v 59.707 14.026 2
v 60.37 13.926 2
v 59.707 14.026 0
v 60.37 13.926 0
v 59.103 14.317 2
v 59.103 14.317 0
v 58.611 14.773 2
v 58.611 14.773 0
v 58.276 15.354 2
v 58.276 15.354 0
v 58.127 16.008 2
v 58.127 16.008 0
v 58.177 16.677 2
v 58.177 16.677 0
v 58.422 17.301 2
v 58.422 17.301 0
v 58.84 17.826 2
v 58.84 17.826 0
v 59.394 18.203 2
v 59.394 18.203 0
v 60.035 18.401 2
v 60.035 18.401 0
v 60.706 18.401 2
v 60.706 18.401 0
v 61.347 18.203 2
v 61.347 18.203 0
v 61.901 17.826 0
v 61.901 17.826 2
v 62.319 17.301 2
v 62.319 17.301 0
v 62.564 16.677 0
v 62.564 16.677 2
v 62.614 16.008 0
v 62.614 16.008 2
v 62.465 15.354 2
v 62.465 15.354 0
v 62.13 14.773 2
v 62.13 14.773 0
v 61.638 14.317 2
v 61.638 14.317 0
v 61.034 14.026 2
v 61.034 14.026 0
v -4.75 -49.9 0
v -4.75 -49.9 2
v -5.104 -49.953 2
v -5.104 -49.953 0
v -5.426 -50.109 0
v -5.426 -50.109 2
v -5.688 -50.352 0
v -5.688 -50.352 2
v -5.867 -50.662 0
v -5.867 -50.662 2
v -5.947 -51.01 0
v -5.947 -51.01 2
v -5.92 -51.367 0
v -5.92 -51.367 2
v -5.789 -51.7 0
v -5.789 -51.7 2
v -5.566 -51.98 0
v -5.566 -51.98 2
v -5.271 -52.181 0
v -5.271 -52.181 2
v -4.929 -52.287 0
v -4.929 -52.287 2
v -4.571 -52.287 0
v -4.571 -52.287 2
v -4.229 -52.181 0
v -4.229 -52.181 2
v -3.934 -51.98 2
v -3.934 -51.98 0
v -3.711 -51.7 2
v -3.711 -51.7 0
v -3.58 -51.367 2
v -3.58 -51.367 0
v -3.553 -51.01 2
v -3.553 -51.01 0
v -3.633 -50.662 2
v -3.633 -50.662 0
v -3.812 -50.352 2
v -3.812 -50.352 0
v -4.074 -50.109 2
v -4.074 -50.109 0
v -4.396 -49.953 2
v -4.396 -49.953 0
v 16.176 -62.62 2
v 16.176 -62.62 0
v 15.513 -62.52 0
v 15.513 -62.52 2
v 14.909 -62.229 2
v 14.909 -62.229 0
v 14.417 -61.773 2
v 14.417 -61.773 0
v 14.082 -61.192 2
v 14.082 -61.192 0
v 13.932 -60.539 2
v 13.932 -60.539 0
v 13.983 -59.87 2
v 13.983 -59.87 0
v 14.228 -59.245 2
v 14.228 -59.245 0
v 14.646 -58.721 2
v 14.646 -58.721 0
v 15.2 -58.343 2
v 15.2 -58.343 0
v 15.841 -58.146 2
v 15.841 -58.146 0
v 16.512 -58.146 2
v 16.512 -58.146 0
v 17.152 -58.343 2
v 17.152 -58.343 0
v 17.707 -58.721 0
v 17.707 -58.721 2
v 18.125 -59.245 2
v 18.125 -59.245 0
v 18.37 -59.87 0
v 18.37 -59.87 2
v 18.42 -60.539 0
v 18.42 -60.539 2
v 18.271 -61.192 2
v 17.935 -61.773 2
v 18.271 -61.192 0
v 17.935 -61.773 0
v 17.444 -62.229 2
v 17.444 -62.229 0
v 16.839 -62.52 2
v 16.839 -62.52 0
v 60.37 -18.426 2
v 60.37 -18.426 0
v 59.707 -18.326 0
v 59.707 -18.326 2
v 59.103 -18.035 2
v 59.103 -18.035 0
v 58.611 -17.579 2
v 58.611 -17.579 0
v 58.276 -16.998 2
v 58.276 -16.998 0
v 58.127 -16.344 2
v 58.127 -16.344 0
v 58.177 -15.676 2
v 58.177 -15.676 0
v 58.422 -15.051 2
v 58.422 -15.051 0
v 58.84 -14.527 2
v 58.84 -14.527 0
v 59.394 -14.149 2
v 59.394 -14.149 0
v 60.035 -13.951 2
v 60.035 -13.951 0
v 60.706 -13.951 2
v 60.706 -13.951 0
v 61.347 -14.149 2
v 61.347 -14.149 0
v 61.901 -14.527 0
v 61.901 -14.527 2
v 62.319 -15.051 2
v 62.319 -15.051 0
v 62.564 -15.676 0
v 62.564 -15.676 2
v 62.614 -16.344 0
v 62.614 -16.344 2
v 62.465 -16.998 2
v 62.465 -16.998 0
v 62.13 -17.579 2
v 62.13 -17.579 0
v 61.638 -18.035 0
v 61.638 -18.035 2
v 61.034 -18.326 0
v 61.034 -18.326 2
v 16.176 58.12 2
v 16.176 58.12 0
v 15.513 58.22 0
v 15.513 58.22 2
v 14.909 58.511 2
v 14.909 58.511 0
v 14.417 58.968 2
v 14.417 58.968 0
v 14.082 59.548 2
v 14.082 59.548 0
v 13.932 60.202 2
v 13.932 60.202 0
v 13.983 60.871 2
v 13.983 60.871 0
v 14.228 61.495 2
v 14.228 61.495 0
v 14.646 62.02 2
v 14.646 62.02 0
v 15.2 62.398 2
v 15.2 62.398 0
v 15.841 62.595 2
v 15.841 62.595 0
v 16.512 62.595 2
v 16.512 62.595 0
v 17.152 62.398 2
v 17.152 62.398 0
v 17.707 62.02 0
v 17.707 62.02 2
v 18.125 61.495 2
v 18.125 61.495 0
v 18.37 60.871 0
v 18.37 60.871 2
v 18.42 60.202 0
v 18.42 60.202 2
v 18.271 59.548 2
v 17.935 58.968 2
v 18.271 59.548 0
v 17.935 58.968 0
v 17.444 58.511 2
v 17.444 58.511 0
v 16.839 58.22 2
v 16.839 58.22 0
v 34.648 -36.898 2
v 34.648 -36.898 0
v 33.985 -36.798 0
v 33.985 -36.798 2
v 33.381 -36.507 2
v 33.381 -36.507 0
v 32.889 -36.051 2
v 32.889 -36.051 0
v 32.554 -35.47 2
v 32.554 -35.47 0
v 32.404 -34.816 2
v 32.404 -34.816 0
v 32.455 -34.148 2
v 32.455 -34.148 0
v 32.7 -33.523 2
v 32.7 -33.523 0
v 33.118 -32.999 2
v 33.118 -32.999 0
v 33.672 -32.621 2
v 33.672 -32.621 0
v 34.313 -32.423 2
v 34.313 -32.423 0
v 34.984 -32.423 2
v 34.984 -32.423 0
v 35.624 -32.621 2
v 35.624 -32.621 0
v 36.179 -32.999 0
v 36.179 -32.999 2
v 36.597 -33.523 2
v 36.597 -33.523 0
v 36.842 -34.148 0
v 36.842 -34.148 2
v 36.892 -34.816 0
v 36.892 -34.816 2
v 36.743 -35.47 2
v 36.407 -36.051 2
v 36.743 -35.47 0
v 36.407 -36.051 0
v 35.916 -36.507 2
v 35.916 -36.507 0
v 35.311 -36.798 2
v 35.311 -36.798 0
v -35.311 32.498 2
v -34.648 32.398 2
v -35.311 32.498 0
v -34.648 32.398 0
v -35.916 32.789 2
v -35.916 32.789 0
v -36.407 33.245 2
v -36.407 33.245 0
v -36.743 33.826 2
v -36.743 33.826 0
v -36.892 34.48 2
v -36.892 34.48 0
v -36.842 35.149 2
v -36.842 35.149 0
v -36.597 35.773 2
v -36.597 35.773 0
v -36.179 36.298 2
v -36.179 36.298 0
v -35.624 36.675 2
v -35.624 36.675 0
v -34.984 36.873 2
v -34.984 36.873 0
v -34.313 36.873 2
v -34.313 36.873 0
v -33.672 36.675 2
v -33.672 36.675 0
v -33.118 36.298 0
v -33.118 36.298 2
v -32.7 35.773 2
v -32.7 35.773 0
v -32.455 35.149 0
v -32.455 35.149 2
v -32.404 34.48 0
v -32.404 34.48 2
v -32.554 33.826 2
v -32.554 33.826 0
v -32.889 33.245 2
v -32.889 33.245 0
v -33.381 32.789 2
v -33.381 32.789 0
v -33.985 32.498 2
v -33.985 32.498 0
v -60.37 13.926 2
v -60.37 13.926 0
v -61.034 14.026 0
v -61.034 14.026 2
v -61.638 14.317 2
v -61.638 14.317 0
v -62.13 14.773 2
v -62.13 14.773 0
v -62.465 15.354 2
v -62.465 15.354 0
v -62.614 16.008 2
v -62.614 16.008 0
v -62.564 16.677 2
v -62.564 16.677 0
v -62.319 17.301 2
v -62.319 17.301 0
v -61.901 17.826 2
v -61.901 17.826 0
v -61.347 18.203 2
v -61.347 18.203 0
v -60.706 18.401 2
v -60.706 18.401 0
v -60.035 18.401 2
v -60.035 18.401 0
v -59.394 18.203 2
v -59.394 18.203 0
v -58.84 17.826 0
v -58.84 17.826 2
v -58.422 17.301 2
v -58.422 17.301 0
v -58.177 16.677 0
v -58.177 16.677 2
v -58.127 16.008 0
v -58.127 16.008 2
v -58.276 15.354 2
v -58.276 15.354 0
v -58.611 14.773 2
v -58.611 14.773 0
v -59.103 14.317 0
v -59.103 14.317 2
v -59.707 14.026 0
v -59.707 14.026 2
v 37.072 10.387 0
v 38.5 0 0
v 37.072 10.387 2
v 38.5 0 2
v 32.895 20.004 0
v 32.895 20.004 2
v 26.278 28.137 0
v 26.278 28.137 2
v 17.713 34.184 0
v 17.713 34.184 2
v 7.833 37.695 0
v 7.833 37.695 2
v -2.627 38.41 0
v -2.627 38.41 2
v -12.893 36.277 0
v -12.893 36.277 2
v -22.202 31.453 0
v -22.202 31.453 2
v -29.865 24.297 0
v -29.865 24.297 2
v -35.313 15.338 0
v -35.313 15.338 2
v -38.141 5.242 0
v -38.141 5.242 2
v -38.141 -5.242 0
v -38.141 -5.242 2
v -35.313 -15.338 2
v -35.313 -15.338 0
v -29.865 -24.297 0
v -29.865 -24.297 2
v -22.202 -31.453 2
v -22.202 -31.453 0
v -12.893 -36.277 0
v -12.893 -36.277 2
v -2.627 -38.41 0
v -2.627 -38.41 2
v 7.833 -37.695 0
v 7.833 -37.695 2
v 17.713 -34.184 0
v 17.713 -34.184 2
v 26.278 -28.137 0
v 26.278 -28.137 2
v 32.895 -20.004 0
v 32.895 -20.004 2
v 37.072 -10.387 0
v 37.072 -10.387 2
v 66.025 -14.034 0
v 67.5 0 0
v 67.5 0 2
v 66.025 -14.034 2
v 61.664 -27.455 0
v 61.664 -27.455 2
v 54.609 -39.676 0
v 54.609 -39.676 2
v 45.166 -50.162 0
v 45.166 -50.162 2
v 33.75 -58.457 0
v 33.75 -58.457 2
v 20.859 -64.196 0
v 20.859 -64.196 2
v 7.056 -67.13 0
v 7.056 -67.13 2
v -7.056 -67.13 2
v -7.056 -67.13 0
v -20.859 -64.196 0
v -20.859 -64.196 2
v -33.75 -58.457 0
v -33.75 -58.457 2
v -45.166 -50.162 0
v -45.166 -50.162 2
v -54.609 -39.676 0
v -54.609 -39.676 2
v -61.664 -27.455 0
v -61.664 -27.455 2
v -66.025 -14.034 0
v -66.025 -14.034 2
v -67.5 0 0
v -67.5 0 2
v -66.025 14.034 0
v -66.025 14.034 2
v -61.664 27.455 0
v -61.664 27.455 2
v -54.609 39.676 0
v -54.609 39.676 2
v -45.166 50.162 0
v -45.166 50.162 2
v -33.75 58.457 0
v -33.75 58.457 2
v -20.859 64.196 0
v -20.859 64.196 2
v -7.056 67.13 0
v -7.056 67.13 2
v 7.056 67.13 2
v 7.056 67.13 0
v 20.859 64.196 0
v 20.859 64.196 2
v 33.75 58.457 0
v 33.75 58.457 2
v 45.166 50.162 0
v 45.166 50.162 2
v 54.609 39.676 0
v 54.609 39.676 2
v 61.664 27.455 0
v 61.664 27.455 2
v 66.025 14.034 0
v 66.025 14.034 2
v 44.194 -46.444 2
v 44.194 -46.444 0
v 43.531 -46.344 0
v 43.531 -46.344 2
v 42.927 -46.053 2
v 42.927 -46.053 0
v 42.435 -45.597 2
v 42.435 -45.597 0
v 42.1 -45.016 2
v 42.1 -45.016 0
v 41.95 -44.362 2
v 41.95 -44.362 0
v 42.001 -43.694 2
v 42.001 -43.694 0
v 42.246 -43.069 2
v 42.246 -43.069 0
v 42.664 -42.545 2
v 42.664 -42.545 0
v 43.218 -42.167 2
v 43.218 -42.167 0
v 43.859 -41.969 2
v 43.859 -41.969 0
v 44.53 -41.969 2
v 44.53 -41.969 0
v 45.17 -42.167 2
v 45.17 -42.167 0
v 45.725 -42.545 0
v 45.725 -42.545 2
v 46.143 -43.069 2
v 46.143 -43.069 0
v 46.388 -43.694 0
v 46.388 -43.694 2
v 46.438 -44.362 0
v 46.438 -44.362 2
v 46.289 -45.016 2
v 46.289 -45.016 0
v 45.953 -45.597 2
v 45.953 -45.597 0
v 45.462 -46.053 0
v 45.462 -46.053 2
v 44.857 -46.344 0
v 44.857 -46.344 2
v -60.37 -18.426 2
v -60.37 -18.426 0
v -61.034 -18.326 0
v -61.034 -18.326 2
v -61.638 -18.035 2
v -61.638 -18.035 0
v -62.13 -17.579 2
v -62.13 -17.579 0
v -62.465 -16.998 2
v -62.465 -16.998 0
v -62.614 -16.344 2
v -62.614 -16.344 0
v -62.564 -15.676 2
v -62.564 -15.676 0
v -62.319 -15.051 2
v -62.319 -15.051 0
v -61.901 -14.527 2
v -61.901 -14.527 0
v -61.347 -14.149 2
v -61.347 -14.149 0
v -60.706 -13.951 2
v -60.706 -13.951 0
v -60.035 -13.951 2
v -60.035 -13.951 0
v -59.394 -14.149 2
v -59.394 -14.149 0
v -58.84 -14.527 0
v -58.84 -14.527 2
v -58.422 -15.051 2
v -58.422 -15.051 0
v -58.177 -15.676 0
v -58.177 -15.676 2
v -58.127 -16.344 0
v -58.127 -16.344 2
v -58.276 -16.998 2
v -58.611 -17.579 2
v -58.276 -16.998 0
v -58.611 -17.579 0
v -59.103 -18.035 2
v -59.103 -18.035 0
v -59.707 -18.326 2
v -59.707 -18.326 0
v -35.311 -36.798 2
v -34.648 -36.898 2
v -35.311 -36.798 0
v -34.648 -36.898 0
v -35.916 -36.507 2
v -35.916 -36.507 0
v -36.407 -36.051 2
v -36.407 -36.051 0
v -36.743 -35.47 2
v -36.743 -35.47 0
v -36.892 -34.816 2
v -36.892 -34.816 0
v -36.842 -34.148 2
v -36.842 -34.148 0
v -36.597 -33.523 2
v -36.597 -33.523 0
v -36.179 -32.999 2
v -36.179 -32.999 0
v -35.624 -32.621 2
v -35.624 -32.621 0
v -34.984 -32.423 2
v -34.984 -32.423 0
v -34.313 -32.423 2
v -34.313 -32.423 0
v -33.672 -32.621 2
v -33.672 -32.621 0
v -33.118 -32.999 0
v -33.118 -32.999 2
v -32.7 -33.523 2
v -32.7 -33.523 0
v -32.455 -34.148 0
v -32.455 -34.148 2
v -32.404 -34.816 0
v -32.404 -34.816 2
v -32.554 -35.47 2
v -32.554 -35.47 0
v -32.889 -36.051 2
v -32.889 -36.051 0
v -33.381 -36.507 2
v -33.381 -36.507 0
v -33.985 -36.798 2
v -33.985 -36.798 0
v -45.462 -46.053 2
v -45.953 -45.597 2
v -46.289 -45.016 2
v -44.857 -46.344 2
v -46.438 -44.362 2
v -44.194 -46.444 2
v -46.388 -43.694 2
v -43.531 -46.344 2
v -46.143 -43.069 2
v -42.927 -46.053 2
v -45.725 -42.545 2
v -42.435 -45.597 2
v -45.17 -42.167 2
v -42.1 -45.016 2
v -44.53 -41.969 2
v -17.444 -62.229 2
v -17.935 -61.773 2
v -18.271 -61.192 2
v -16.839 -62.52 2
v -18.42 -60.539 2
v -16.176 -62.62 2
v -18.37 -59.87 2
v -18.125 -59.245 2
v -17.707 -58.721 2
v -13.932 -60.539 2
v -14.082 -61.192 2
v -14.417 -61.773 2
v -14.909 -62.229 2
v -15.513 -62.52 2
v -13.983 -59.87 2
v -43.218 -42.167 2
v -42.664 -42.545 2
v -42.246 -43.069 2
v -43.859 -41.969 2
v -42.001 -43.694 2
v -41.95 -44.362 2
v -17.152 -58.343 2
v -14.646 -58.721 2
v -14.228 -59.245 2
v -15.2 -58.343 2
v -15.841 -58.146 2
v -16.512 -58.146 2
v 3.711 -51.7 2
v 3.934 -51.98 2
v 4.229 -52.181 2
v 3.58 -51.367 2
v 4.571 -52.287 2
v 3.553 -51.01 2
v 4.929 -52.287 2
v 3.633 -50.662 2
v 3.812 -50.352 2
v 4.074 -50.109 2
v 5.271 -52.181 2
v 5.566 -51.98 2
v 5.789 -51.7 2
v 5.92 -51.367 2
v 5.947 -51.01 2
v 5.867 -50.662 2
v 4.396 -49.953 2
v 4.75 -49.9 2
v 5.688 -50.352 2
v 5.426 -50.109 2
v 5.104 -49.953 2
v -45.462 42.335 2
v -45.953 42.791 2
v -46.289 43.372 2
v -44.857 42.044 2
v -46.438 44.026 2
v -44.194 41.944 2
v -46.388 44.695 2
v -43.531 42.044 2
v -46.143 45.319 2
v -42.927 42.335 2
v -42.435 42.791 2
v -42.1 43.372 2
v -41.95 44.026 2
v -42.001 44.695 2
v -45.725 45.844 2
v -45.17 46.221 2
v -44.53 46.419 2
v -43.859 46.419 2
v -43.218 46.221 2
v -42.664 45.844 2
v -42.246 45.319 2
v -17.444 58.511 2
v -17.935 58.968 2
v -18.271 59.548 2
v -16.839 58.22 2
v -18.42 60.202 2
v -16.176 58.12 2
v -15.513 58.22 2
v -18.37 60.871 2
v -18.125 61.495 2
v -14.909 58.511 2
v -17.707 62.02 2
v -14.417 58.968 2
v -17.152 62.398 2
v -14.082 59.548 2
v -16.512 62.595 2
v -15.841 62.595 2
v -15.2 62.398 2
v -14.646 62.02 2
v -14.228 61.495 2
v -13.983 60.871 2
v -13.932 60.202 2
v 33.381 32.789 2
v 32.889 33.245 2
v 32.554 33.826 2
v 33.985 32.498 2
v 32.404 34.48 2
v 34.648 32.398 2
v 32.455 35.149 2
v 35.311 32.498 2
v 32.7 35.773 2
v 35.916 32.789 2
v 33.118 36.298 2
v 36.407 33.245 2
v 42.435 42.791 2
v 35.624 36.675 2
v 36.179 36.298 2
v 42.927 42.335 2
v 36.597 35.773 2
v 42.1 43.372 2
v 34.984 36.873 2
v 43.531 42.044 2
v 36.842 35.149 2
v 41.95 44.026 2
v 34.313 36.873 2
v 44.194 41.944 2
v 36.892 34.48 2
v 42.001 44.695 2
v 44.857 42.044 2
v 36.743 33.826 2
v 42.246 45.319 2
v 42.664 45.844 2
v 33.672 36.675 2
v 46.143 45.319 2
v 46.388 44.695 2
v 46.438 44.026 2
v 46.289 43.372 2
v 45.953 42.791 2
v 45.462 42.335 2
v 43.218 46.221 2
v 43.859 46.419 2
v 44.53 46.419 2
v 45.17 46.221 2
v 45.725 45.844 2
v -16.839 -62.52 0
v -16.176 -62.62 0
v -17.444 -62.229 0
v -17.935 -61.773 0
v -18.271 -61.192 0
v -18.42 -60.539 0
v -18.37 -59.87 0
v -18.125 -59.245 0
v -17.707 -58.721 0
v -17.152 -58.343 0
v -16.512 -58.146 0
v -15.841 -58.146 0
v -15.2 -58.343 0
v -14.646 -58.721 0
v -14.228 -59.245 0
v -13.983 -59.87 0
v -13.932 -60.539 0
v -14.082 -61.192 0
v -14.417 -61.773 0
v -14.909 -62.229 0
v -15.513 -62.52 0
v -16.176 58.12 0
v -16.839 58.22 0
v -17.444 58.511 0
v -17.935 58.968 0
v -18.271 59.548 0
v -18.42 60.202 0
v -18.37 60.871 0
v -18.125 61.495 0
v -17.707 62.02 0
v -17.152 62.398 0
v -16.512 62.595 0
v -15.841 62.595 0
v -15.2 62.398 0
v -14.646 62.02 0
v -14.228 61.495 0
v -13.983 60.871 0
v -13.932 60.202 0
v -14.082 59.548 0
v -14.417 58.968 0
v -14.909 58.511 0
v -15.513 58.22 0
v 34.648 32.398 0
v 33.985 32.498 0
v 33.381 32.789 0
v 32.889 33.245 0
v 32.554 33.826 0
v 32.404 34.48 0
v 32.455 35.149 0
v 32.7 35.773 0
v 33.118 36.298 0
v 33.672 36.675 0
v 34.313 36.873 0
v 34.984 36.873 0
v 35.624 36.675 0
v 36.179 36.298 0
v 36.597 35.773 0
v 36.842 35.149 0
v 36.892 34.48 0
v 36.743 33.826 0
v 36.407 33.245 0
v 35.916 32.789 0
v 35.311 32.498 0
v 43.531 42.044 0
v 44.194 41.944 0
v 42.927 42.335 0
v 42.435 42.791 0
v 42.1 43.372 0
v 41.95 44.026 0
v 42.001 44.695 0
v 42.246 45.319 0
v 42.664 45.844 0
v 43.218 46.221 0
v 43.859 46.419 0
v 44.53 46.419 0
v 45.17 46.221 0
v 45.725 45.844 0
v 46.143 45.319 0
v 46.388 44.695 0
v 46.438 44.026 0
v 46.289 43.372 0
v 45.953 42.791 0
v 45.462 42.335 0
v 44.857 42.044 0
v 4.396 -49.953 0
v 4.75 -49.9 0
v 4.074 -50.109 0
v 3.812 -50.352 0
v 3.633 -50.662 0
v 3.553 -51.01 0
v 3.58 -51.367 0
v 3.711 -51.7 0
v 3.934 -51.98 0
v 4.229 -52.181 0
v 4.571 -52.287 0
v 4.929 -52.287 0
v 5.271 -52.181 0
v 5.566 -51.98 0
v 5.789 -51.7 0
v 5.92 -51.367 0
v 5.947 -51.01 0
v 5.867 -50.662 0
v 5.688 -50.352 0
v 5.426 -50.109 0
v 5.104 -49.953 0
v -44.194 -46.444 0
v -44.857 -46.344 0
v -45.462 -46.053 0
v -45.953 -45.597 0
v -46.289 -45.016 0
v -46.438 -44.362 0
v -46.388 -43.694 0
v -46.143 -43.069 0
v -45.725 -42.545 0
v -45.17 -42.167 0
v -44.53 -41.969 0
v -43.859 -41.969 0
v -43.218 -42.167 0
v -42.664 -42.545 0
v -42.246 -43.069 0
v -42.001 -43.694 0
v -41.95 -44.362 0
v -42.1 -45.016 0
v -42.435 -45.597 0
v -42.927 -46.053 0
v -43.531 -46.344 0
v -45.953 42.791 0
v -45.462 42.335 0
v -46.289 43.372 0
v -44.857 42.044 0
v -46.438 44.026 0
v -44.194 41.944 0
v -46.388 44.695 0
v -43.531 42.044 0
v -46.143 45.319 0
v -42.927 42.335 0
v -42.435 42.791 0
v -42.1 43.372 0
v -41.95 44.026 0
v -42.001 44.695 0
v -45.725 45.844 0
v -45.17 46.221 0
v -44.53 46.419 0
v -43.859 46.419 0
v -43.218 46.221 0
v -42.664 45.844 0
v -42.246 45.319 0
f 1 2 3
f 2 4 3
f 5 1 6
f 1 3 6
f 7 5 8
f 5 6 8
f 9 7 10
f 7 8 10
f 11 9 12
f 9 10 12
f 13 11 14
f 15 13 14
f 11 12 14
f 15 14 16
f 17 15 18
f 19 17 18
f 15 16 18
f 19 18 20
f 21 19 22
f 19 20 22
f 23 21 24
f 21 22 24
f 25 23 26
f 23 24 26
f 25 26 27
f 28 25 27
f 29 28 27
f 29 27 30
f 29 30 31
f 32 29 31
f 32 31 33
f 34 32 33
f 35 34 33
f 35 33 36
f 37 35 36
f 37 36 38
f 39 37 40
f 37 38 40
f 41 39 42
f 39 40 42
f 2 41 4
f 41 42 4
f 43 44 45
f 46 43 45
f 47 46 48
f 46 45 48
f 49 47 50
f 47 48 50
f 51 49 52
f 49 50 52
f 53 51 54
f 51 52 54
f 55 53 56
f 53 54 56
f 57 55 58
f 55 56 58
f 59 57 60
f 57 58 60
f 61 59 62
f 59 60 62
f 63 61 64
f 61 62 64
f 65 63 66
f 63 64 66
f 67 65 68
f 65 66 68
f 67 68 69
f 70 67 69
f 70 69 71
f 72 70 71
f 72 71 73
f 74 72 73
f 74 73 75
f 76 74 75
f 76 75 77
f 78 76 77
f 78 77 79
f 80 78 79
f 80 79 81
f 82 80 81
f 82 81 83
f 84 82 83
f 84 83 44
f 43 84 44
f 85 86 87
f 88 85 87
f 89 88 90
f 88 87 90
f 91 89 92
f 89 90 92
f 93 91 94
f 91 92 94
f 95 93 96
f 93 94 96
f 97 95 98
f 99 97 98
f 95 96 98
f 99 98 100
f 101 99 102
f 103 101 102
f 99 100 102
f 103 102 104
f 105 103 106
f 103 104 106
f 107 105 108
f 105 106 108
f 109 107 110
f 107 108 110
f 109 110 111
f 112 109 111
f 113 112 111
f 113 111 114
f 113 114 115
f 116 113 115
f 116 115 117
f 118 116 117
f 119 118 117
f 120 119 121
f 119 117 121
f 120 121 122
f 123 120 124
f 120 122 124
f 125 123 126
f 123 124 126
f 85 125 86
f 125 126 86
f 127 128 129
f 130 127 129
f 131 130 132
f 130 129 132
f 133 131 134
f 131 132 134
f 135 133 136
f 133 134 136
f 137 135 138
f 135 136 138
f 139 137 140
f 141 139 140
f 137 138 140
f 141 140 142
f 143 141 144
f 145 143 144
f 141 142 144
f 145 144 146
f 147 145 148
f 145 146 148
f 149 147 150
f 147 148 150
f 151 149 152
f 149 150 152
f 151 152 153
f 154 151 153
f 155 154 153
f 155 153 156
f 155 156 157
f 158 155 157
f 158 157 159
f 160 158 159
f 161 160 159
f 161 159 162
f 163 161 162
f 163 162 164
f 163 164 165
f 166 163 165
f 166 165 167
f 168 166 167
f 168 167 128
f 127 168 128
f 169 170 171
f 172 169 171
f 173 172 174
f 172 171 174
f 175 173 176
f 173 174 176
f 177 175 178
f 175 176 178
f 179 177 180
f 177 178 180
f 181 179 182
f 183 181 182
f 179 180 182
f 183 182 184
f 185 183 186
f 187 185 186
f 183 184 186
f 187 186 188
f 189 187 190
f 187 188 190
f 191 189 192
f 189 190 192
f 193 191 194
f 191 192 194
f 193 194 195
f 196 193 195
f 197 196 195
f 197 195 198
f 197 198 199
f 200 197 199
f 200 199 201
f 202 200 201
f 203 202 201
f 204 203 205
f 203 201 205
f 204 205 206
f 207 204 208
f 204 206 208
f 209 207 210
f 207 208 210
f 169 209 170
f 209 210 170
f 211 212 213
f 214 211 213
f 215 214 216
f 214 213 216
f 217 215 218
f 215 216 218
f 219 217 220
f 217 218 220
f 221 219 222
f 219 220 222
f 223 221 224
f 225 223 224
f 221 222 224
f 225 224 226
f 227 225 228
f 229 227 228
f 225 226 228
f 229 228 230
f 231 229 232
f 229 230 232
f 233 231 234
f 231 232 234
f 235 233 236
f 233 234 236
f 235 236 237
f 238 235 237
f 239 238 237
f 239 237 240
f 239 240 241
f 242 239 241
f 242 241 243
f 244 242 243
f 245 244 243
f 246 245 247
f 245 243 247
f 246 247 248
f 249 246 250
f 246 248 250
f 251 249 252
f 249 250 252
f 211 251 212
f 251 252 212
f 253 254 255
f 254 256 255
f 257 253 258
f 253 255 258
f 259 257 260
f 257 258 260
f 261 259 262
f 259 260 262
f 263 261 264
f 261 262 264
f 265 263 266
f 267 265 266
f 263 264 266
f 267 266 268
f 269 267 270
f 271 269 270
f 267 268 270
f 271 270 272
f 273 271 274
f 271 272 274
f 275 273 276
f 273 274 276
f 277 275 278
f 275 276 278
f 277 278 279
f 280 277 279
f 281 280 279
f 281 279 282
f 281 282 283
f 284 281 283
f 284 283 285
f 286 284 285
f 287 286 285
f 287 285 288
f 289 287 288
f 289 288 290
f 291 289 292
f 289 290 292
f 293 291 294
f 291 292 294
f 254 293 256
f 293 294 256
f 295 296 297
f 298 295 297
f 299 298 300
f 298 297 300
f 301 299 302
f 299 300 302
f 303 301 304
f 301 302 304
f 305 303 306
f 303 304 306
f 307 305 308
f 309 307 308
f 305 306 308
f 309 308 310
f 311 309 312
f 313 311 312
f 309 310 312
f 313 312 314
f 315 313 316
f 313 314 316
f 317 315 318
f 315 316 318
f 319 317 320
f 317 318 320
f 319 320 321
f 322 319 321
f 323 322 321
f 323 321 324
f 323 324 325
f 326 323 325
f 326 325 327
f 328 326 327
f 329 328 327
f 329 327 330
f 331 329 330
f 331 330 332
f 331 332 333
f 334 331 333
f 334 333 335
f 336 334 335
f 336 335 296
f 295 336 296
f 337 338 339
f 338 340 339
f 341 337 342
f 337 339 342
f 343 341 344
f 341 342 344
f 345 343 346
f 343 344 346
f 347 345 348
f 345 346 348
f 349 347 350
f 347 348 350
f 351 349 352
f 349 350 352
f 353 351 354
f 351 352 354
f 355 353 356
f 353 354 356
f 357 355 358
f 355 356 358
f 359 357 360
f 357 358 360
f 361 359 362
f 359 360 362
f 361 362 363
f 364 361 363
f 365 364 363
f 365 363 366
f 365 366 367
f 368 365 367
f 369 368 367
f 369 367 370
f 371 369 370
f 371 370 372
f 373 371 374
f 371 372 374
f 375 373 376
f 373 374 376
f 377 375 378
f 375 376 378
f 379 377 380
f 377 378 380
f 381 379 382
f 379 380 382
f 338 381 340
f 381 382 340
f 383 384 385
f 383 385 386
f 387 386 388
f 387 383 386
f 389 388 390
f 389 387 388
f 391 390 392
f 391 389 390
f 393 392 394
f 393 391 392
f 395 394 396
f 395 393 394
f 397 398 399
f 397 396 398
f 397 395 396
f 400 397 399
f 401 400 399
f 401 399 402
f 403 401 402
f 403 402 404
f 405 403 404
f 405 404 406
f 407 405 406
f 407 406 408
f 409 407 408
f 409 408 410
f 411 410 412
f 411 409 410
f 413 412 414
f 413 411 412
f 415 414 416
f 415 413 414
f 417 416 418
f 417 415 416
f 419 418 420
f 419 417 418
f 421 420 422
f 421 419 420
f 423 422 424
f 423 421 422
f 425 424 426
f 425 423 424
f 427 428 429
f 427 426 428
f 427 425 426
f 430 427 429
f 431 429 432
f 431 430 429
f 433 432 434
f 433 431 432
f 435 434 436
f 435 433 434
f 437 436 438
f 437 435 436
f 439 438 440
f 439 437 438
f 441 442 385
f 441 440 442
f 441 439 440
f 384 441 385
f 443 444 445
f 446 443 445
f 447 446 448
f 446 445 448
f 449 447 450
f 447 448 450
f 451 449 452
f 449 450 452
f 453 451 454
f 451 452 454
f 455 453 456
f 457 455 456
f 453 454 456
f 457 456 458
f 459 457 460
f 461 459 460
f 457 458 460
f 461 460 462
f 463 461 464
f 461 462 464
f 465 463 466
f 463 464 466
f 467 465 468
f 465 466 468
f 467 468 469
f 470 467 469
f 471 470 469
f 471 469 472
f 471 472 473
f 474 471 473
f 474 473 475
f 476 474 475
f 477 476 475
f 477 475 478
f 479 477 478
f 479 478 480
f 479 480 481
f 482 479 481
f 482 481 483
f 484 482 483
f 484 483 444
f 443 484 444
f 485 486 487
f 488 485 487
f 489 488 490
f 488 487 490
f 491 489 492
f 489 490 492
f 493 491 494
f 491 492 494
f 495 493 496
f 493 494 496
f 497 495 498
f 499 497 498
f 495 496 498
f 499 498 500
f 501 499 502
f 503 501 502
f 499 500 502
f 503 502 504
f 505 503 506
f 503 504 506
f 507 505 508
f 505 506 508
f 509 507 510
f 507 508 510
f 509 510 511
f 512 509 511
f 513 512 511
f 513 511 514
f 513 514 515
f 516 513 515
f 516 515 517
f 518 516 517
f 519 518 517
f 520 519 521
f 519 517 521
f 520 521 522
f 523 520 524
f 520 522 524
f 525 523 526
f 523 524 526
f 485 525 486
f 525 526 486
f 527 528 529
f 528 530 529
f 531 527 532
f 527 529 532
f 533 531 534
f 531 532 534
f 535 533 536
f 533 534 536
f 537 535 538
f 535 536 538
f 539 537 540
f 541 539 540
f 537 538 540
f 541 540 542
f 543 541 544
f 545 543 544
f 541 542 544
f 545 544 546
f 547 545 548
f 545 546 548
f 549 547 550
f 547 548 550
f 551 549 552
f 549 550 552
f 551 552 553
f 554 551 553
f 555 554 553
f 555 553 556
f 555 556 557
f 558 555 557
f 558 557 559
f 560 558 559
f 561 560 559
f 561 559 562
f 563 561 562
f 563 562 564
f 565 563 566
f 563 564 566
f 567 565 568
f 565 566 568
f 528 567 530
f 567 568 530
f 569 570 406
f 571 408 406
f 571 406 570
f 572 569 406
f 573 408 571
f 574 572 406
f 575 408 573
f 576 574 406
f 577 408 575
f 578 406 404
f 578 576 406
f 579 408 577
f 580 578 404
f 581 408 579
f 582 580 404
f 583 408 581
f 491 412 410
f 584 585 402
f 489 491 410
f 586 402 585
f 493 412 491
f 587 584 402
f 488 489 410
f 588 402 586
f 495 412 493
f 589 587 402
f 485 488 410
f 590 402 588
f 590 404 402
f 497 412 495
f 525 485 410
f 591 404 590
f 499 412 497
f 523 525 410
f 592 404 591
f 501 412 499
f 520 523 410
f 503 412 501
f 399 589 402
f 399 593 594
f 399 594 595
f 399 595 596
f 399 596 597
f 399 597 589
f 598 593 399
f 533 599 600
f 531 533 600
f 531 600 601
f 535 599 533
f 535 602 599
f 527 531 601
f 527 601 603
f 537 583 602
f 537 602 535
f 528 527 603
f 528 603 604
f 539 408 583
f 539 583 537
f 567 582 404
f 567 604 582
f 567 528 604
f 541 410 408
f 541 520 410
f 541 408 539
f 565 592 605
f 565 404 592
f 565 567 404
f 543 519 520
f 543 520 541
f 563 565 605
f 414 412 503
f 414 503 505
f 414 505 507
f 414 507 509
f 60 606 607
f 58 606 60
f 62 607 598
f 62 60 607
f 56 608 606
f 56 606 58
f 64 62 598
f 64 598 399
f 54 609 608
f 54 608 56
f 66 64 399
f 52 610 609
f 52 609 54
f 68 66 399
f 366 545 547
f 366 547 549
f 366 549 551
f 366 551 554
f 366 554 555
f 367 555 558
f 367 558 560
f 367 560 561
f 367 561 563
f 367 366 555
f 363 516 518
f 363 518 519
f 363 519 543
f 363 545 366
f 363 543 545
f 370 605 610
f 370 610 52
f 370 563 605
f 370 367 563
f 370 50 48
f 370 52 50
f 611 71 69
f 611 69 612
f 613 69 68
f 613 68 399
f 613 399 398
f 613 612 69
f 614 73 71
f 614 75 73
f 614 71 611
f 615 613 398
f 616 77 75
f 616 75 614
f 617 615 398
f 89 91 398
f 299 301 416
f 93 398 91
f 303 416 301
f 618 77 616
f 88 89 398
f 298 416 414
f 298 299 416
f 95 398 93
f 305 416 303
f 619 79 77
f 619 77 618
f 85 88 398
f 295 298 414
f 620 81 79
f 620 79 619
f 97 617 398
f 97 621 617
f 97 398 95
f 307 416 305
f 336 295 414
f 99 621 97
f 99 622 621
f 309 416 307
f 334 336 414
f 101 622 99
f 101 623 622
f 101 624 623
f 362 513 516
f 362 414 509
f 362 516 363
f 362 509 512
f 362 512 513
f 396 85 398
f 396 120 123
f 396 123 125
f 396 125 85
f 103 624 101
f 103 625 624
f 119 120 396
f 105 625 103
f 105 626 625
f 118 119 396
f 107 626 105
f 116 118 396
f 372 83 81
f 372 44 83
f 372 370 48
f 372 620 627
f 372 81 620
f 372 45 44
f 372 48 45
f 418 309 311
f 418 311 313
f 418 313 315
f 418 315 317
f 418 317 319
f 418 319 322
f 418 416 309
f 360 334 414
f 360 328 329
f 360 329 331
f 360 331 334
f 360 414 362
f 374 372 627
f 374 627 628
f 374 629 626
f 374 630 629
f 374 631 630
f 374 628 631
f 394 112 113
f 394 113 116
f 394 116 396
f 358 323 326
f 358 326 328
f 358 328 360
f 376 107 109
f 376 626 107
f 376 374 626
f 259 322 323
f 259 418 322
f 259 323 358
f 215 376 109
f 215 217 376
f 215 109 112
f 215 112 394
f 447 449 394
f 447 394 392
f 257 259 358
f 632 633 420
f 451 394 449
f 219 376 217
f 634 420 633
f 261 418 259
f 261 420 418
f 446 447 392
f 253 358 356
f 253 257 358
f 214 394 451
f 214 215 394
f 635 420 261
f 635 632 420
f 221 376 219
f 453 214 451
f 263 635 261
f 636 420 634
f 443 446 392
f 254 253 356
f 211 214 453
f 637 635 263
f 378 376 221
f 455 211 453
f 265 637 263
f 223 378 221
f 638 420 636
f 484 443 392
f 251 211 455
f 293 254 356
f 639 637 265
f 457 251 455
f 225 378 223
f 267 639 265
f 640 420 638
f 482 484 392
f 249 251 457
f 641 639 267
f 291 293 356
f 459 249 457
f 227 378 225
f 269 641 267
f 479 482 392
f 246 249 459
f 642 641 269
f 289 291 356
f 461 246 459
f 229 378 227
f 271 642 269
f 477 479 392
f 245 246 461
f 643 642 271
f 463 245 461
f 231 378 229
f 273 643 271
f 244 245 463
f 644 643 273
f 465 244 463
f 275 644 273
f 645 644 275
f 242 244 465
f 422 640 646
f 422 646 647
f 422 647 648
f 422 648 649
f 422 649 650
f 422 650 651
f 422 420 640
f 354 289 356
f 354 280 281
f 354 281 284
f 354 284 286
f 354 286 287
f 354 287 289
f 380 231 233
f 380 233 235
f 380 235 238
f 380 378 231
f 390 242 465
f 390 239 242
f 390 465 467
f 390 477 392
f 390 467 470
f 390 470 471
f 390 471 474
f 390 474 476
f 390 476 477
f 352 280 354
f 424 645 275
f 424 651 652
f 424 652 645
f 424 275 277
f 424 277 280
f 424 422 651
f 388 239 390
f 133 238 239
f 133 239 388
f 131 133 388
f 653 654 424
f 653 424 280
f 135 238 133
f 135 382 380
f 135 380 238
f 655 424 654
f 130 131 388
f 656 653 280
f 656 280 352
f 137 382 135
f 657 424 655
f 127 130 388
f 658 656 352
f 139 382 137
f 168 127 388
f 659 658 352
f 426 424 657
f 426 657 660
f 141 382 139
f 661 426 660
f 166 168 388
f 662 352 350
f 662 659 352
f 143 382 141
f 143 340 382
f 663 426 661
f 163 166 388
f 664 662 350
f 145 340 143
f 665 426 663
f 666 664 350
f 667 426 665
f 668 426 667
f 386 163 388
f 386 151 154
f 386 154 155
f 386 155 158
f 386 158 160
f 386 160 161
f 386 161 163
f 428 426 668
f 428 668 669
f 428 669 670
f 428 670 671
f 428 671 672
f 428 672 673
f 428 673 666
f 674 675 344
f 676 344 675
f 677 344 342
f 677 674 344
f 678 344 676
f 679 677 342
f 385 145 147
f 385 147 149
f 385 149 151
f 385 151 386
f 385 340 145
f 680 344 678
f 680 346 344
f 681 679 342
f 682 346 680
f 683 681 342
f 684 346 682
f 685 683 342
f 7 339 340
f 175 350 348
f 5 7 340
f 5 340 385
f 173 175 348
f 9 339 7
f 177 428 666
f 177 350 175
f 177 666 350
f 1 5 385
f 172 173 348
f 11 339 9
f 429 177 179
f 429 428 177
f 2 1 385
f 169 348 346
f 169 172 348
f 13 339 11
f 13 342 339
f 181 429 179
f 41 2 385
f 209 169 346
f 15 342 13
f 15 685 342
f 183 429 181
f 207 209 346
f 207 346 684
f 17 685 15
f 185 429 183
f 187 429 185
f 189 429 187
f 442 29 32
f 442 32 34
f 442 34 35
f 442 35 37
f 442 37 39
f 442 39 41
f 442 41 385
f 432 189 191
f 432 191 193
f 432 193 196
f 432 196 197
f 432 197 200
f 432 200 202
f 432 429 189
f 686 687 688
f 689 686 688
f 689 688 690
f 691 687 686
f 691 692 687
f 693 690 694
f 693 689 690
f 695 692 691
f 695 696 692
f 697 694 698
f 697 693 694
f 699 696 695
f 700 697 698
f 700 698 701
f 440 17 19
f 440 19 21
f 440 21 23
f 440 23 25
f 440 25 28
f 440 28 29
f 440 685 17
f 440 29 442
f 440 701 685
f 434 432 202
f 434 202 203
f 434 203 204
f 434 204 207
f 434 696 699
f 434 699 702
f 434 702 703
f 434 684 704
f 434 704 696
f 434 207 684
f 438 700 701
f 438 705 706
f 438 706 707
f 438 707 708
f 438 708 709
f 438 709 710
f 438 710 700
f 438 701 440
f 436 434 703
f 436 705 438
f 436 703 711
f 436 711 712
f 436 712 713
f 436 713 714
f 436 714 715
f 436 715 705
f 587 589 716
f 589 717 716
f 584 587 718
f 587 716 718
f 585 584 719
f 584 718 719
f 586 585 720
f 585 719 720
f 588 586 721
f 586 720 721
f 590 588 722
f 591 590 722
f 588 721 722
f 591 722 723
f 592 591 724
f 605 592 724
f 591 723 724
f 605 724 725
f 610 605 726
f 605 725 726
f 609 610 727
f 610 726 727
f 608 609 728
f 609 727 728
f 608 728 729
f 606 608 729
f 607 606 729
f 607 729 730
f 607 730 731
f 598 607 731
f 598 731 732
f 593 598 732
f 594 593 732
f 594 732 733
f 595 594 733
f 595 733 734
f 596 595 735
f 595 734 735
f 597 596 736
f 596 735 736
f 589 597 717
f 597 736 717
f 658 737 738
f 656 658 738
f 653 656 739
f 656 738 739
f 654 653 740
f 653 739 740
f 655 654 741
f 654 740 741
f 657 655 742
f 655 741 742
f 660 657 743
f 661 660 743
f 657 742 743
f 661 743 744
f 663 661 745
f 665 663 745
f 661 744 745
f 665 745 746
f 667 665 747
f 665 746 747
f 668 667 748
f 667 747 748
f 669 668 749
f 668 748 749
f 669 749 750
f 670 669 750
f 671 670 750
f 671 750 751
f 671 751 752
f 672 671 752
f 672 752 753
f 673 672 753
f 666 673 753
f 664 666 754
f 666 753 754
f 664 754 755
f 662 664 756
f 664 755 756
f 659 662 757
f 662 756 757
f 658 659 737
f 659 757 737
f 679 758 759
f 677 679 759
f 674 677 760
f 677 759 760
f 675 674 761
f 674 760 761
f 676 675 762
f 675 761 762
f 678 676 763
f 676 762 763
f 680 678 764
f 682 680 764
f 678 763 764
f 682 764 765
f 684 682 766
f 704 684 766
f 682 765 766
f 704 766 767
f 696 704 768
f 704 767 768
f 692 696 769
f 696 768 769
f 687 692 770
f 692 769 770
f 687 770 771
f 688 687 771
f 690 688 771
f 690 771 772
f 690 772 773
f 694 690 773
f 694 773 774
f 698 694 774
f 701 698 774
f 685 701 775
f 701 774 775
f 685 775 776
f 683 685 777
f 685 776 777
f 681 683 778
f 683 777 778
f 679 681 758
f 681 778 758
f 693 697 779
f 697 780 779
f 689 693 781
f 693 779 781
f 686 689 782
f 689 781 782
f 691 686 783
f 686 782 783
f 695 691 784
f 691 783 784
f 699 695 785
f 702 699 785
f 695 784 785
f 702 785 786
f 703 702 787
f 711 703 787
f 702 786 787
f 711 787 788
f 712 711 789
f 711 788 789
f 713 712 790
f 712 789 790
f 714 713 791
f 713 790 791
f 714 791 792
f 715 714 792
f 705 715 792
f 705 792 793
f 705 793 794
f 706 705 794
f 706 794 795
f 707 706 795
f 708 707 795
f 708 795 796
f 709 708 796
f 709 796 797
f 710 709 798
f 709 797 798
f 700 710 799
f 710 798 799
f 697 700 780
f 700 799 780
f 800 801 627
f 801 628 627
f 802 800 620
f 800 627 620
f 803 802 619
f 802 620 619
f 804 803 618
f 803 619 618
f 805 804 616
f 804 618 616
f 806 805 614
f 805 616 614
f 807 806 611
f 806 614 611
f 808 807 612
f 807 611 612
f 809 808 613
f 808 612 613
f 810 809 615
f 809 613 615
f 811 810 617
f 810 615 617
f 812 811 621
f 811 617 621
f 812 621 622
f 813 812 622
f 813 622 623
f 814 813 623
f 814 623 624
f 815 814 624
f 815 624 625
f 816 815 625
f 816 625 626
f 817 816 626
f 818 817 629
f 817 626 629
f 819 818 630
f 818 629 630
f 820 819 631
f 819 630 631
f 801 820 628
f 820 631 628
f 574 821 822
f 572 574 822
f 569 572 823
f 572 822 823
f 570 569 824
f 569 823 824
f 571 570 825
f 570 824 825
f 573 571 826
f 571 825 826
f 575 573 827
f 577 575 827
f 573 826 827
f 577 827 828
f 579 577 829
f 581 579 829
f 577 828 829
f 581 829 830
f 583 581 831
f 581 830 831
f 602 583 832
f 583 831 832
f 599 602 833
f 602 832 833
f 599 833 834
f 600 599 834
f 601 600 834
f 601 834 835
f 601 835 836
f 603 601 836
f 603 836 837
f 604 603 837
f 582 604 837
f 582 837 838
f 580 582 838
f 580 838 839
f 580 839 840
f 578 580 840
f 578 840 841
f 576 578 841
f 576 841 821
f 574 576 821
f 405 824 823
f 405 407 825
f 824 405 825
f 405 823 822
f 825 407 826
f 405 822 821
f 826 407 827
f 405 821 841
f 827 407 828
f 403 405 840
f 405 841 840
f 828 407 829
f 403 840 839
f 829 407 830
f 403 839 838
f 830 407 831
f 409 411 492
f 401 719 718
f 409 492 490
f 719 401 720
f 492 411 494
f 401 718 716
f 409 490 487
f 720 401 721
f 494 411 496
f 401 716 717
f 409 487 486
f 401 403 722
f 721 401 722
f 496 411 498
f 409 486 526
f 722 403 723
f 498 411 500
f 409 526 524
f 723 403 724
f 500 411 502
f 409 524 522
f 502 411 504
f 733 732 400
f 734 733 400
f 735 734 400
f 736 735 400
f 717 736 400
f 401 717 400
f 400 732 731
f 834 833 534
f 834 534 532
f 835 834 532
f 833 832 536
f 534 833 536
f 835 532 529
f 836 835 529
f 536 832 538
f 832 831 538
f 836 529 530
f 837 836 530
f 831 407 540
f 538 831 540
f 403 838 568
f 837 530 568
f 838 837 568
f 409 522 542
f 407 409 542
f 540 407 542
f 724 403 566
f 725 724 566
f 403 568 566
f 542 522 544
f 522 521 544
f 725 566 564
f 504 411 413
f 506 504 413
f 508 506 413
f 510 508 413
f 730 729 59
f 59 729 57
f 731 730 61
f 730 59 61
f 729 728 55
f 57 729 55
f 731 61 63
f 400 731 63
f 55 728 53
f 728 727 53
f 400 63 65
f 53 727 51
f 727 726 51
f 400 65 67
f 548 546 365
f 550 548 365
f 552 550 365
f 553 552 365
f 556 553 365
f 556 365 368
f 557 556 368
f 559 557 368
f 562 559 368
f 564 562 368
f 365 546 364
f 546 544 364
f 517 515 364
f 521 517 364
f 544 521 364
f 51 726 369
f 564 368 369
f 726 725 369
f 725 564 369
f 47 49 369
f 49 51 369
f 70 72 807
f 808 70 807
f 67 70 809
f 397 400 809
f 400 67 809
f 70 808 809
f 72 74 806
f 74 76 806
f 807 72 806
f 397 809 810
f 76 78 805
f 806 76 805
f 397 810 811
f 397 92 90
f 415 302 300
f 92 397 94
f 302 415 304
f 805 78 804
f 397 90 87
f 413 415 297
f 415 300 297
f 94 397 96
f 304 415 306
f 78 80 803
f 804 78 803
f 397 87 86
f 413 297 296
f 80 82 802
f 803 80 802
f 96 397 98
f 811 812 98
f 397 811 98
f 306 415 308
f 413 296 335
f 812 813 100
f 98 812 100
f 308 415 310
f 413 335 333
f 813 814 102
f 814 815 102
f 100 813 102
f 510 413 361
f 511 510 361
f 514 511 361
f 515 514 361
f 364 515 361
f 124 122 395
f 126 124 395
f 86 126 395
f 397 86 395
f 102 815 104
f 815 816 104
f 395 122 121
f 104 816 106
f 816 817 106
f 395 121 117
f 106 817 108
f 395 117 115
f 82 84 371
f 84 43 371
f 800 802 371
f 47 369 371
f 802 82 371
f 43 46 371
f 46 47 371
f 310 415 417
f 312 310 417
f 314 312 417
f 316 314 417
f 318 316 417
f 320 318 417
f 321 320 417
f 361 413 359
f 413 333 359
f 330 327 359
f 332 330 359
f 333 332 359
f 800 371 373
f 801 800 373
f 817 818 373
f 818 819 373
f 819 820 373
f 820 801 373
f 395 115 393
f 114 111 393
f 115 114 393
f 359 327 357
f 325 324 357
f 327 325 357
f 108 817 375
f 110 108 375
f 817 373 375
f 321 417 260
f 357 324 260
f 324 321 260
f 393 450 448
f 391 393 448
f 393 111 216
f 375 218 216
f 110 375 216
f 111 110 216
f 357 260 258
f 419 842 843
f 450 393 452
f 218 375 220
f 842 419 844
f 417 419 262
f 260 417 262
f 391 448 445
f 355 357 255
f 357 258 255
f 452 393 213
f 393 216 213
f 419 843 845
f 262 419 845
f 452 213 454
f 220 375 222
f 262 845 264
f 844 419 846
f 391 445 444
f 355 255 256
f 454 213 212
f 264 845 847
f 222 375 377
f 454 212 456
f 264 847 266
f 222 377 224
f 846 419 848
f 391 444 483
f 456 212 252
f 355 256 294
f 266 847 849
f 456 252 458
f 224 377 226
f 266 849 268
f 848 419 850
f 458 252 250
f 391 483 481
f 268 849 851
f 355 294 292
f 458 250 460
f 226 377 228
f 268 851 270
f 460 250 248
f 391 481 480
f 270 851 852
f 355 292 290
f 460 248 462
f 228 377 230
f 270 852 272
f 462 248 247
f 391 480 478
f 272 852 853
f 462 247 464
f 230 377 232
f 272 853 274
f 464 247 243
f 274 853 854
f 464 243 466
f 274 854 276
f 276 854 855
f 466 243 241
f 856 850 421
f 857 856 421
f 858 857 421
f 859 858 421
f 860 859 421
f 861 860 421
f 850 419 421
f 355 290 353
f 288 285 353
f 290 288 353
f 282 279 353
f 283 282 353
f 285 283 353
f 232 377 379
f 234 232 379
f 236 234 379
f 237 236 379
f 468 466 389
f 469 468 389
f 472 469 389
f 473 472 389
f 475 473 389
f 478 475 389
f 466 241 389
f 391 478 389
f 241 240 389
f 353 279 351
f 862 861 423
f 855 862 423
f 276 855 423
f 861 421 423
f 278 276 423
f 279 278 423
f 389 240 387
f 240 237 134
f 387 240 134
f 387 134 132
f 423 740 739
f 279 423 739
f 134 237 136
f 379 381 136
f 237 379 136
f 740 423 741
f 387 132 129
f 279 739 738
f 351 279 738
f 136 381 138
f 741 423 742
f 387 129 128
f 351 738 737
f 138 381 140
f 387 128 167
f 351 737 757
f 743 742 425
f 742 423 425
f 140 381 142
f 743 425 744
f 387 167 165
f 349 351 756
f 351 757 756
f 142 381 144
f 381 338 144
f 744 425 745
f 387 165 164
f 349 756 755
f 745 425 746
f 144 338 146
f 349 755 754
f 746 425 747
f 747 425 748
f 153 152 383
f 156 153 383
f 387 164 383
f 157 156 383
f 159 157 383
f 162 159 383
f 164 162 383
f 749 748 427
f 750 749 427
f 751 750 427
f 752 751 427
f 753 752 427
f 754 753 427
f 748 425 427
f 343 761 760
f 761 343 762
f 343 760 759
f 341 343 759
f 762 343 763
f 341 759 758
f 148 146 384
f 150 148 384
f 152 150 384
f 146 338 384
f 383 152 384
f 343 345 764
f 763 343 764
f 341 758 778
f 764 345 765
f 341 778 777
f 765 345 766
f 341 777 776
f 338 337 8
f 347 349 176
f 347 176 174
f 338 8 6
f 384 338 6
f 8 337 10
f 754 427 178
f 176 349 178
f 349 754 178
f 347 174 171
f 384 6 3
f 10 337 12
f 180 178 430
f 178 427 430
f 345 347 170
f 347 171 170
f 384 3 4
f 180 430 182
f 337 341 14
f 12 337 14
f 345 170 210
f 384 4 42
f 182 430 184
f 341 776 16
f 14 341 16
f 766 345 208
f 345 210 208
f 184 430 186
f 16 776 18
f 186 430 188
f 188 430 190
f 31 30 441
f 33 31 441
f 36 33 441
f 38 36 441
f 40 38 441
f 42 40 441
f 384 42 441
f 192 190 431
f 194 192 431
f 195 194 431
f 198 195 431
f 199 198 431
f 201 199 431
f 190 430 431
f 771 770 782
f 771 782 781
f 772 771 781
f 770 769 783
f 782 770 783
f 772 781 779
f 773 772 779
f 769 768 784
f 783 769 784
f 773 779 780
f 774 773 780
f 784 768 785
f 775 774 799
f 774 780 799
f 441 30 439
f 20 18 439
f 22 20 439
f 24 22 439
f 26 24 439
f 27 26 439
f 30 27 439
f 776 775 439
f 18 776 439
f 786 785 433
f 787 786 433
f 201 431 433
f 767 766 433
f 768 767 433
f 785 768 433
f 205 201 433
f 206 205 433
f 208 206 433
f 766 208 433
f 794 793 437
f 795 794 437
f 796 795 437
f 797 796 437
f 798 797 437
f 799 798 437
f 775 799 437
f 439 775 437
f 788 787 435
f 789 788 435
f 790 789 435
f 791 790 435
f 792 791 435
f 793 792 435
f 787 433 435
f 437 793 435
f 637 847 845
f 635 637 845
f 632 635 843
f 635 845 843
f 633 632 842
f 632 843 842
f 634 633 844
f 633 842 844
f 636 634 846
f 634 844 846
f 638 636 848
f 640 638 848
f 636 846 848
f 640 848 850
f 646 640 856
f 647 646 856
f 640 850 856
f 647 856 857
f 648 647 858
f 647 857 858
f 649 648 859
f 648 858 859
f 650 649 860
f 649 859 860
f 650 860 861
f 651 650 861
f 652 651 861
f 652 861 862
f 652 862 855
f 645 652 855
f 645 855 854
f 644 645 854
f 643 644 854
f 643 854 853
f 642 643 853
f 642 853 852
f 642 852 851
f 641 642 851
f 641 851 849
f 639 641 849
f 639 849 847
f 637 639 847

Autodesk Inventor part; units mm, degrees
ref_plane "YZ Plane" through (0, 0, 0) normal (1, 0, 0) x (0, 1, 0)
ref_plane "XZ Plane" through (0, 0, 0) normal (0, 1, 0) x (-1, 0, 0)
ref_plane "XY Plane" through (0, 0, 0) normal (0, 0, 1) x (1, 0, 0)
sketch "スケッチ1" plane through (0, 0, 0) normal (0, 0, 1) x (1, 0, 0)
  circle A0 centre (0, 0) radius 67.5
  dimension "d0" = 135
extrude "プレート1" add sketch "スケッチ1" along normal blind 2
sketch "スケッチ2" plane through (0, 0, 2) normal (0, 0, 1) x (1, 0, 0)
  circle A0 centre (0, 0) radius 38.5
  dimension "d2" = 77
extrude "押し出し1" cut sketch "スケッチ2" against normal through all
sketch "スケッチ3" plane through (0, 0, 2) normal (0, 0, 1) x (1, 0, 0)
  circle A0 centre (0, 0) radius 62.5
  point P0 (16.1762, 60.3704)
  point P1 (-16.1762, 60.3704)
  point P2 (-44.1942, 44.1942)
  point P3 (-60.3704, 16.1762)
  point P4 (-60.3704, -16.1762)
  point P5 (-44.1942, -44.1942)
  point P6 (-16.1762, -60.3704)
  point P7 (16.1762, -60.3704)
  point P8 (44.1942, -44.1942)
  point P9 (60.3704, -16.1762)
  point P10 (60.3704, 16.1762)
  point P11 (44.1942, 44.1942)
  dimension "d5" = 125
  dimension "d8" = 360
  dimension "d36" = 0
hole "穴1" at (16.1762, 60.3704, 2) at (-16.1762, 60.3704, 2) at (-44.1942, 44.1942, 2) at (-60.3704, 16.1762, 2) at (-60.3704, -16.1762, 2) at (-44.1942, -44.1942, 2) at (-16.1762, -60.3704, 2) at (16.1762, -60.3704, 2) at (44.1942, -44.1942, 2) at (60.3704, -16.1762, 2) at (60.3704, 16.1762, 2) at (44.1942, 44.1942, 2) direction (0, 0, -1) diameter 4.5 end through all clearance for "Flat Head Machine Screw" size "M4" standard "Ansi Metric M Profile"
sketch "スケッチ4" plane through (0, 0, 2) normal (0, 0, 1) x (1, 0, 0)
  circle A0 centre (0, 0) radius 49
  point P0 (-34.6482, 34.6482)
  point P1 (-34.6482, -34.6482)
  point P2 (34.6482, -34.6482)
  point P3 (34.6482, 34.6482)
  dimension "d17" = 98
  dimension "d20" = 360
  dimension "d29" = 0
hole "穴2" at (-34.6482, 34.6482, 2) at (-34.6482, -34.6482, 2) at (34.6482, -34.6482, 2) at (34.6482, 34.6482, 2) direction (0, 0, -1) diameter 4.5 end through all clearance for "Flat Head Machine Screw" size "M4" standard "Ansi Metric M Profile"
sketch "スケッチ6" plane through (0, 0, 0) normal (0, 0, -1) x (-1, 0, 0)
  circle A0 centre (0, 0) radius 37.5
  line L0 (-4.75, -42.3) -> (4.75, -42.3)
  line L1 (-4.75, -37.5) -> (4.75, -37.5)
  circle A1 centre (0, -37.5) radius 4.8
  point P0 (-4.75, -51.1)
  point P1 (4.75, -51.1)
  dimension "d37" = 75
  dimension "d38" = 9.5
  dimension "d39" = 8.8
  dimension "d40" = 13.6
  dimension "d41" = 4.75
hole "穴3" at (4.75, -51.1, 0) at (-4.75, -51.1, 0) direction (0, 0, 1) diameter 2.4 end through all clearance for "Socket Head Cap Screw" size "M2" standard "Ansi Metric M Profile"
equation "\"d15\" = Thickness"
equation "\"d27\" = Thickness"
equation "\"d47\" = Thickness"
equation "\"d1\" = Thickness"
equation "\"BendRadius\" = Thickness"
equation "\"BendReliefWidth\" = Thickness"
equation "\"BendReliefDepth\" = 0.5 * Thickness"
equation "\"CornerReliefSize\" = 4 * Thickness"
equation "\"MinimumRemnant\" = 2 * Thickness"
equation "\"TransitionRadius\" = BendRadius"
equation "\"JacobiRadiusSize\" = BendRadius"
equation "\"GapSize\" = Thickness"
equation "\"Thickness\" = 2"
properties part number "unit-j2-plate1" material "CFRP"
